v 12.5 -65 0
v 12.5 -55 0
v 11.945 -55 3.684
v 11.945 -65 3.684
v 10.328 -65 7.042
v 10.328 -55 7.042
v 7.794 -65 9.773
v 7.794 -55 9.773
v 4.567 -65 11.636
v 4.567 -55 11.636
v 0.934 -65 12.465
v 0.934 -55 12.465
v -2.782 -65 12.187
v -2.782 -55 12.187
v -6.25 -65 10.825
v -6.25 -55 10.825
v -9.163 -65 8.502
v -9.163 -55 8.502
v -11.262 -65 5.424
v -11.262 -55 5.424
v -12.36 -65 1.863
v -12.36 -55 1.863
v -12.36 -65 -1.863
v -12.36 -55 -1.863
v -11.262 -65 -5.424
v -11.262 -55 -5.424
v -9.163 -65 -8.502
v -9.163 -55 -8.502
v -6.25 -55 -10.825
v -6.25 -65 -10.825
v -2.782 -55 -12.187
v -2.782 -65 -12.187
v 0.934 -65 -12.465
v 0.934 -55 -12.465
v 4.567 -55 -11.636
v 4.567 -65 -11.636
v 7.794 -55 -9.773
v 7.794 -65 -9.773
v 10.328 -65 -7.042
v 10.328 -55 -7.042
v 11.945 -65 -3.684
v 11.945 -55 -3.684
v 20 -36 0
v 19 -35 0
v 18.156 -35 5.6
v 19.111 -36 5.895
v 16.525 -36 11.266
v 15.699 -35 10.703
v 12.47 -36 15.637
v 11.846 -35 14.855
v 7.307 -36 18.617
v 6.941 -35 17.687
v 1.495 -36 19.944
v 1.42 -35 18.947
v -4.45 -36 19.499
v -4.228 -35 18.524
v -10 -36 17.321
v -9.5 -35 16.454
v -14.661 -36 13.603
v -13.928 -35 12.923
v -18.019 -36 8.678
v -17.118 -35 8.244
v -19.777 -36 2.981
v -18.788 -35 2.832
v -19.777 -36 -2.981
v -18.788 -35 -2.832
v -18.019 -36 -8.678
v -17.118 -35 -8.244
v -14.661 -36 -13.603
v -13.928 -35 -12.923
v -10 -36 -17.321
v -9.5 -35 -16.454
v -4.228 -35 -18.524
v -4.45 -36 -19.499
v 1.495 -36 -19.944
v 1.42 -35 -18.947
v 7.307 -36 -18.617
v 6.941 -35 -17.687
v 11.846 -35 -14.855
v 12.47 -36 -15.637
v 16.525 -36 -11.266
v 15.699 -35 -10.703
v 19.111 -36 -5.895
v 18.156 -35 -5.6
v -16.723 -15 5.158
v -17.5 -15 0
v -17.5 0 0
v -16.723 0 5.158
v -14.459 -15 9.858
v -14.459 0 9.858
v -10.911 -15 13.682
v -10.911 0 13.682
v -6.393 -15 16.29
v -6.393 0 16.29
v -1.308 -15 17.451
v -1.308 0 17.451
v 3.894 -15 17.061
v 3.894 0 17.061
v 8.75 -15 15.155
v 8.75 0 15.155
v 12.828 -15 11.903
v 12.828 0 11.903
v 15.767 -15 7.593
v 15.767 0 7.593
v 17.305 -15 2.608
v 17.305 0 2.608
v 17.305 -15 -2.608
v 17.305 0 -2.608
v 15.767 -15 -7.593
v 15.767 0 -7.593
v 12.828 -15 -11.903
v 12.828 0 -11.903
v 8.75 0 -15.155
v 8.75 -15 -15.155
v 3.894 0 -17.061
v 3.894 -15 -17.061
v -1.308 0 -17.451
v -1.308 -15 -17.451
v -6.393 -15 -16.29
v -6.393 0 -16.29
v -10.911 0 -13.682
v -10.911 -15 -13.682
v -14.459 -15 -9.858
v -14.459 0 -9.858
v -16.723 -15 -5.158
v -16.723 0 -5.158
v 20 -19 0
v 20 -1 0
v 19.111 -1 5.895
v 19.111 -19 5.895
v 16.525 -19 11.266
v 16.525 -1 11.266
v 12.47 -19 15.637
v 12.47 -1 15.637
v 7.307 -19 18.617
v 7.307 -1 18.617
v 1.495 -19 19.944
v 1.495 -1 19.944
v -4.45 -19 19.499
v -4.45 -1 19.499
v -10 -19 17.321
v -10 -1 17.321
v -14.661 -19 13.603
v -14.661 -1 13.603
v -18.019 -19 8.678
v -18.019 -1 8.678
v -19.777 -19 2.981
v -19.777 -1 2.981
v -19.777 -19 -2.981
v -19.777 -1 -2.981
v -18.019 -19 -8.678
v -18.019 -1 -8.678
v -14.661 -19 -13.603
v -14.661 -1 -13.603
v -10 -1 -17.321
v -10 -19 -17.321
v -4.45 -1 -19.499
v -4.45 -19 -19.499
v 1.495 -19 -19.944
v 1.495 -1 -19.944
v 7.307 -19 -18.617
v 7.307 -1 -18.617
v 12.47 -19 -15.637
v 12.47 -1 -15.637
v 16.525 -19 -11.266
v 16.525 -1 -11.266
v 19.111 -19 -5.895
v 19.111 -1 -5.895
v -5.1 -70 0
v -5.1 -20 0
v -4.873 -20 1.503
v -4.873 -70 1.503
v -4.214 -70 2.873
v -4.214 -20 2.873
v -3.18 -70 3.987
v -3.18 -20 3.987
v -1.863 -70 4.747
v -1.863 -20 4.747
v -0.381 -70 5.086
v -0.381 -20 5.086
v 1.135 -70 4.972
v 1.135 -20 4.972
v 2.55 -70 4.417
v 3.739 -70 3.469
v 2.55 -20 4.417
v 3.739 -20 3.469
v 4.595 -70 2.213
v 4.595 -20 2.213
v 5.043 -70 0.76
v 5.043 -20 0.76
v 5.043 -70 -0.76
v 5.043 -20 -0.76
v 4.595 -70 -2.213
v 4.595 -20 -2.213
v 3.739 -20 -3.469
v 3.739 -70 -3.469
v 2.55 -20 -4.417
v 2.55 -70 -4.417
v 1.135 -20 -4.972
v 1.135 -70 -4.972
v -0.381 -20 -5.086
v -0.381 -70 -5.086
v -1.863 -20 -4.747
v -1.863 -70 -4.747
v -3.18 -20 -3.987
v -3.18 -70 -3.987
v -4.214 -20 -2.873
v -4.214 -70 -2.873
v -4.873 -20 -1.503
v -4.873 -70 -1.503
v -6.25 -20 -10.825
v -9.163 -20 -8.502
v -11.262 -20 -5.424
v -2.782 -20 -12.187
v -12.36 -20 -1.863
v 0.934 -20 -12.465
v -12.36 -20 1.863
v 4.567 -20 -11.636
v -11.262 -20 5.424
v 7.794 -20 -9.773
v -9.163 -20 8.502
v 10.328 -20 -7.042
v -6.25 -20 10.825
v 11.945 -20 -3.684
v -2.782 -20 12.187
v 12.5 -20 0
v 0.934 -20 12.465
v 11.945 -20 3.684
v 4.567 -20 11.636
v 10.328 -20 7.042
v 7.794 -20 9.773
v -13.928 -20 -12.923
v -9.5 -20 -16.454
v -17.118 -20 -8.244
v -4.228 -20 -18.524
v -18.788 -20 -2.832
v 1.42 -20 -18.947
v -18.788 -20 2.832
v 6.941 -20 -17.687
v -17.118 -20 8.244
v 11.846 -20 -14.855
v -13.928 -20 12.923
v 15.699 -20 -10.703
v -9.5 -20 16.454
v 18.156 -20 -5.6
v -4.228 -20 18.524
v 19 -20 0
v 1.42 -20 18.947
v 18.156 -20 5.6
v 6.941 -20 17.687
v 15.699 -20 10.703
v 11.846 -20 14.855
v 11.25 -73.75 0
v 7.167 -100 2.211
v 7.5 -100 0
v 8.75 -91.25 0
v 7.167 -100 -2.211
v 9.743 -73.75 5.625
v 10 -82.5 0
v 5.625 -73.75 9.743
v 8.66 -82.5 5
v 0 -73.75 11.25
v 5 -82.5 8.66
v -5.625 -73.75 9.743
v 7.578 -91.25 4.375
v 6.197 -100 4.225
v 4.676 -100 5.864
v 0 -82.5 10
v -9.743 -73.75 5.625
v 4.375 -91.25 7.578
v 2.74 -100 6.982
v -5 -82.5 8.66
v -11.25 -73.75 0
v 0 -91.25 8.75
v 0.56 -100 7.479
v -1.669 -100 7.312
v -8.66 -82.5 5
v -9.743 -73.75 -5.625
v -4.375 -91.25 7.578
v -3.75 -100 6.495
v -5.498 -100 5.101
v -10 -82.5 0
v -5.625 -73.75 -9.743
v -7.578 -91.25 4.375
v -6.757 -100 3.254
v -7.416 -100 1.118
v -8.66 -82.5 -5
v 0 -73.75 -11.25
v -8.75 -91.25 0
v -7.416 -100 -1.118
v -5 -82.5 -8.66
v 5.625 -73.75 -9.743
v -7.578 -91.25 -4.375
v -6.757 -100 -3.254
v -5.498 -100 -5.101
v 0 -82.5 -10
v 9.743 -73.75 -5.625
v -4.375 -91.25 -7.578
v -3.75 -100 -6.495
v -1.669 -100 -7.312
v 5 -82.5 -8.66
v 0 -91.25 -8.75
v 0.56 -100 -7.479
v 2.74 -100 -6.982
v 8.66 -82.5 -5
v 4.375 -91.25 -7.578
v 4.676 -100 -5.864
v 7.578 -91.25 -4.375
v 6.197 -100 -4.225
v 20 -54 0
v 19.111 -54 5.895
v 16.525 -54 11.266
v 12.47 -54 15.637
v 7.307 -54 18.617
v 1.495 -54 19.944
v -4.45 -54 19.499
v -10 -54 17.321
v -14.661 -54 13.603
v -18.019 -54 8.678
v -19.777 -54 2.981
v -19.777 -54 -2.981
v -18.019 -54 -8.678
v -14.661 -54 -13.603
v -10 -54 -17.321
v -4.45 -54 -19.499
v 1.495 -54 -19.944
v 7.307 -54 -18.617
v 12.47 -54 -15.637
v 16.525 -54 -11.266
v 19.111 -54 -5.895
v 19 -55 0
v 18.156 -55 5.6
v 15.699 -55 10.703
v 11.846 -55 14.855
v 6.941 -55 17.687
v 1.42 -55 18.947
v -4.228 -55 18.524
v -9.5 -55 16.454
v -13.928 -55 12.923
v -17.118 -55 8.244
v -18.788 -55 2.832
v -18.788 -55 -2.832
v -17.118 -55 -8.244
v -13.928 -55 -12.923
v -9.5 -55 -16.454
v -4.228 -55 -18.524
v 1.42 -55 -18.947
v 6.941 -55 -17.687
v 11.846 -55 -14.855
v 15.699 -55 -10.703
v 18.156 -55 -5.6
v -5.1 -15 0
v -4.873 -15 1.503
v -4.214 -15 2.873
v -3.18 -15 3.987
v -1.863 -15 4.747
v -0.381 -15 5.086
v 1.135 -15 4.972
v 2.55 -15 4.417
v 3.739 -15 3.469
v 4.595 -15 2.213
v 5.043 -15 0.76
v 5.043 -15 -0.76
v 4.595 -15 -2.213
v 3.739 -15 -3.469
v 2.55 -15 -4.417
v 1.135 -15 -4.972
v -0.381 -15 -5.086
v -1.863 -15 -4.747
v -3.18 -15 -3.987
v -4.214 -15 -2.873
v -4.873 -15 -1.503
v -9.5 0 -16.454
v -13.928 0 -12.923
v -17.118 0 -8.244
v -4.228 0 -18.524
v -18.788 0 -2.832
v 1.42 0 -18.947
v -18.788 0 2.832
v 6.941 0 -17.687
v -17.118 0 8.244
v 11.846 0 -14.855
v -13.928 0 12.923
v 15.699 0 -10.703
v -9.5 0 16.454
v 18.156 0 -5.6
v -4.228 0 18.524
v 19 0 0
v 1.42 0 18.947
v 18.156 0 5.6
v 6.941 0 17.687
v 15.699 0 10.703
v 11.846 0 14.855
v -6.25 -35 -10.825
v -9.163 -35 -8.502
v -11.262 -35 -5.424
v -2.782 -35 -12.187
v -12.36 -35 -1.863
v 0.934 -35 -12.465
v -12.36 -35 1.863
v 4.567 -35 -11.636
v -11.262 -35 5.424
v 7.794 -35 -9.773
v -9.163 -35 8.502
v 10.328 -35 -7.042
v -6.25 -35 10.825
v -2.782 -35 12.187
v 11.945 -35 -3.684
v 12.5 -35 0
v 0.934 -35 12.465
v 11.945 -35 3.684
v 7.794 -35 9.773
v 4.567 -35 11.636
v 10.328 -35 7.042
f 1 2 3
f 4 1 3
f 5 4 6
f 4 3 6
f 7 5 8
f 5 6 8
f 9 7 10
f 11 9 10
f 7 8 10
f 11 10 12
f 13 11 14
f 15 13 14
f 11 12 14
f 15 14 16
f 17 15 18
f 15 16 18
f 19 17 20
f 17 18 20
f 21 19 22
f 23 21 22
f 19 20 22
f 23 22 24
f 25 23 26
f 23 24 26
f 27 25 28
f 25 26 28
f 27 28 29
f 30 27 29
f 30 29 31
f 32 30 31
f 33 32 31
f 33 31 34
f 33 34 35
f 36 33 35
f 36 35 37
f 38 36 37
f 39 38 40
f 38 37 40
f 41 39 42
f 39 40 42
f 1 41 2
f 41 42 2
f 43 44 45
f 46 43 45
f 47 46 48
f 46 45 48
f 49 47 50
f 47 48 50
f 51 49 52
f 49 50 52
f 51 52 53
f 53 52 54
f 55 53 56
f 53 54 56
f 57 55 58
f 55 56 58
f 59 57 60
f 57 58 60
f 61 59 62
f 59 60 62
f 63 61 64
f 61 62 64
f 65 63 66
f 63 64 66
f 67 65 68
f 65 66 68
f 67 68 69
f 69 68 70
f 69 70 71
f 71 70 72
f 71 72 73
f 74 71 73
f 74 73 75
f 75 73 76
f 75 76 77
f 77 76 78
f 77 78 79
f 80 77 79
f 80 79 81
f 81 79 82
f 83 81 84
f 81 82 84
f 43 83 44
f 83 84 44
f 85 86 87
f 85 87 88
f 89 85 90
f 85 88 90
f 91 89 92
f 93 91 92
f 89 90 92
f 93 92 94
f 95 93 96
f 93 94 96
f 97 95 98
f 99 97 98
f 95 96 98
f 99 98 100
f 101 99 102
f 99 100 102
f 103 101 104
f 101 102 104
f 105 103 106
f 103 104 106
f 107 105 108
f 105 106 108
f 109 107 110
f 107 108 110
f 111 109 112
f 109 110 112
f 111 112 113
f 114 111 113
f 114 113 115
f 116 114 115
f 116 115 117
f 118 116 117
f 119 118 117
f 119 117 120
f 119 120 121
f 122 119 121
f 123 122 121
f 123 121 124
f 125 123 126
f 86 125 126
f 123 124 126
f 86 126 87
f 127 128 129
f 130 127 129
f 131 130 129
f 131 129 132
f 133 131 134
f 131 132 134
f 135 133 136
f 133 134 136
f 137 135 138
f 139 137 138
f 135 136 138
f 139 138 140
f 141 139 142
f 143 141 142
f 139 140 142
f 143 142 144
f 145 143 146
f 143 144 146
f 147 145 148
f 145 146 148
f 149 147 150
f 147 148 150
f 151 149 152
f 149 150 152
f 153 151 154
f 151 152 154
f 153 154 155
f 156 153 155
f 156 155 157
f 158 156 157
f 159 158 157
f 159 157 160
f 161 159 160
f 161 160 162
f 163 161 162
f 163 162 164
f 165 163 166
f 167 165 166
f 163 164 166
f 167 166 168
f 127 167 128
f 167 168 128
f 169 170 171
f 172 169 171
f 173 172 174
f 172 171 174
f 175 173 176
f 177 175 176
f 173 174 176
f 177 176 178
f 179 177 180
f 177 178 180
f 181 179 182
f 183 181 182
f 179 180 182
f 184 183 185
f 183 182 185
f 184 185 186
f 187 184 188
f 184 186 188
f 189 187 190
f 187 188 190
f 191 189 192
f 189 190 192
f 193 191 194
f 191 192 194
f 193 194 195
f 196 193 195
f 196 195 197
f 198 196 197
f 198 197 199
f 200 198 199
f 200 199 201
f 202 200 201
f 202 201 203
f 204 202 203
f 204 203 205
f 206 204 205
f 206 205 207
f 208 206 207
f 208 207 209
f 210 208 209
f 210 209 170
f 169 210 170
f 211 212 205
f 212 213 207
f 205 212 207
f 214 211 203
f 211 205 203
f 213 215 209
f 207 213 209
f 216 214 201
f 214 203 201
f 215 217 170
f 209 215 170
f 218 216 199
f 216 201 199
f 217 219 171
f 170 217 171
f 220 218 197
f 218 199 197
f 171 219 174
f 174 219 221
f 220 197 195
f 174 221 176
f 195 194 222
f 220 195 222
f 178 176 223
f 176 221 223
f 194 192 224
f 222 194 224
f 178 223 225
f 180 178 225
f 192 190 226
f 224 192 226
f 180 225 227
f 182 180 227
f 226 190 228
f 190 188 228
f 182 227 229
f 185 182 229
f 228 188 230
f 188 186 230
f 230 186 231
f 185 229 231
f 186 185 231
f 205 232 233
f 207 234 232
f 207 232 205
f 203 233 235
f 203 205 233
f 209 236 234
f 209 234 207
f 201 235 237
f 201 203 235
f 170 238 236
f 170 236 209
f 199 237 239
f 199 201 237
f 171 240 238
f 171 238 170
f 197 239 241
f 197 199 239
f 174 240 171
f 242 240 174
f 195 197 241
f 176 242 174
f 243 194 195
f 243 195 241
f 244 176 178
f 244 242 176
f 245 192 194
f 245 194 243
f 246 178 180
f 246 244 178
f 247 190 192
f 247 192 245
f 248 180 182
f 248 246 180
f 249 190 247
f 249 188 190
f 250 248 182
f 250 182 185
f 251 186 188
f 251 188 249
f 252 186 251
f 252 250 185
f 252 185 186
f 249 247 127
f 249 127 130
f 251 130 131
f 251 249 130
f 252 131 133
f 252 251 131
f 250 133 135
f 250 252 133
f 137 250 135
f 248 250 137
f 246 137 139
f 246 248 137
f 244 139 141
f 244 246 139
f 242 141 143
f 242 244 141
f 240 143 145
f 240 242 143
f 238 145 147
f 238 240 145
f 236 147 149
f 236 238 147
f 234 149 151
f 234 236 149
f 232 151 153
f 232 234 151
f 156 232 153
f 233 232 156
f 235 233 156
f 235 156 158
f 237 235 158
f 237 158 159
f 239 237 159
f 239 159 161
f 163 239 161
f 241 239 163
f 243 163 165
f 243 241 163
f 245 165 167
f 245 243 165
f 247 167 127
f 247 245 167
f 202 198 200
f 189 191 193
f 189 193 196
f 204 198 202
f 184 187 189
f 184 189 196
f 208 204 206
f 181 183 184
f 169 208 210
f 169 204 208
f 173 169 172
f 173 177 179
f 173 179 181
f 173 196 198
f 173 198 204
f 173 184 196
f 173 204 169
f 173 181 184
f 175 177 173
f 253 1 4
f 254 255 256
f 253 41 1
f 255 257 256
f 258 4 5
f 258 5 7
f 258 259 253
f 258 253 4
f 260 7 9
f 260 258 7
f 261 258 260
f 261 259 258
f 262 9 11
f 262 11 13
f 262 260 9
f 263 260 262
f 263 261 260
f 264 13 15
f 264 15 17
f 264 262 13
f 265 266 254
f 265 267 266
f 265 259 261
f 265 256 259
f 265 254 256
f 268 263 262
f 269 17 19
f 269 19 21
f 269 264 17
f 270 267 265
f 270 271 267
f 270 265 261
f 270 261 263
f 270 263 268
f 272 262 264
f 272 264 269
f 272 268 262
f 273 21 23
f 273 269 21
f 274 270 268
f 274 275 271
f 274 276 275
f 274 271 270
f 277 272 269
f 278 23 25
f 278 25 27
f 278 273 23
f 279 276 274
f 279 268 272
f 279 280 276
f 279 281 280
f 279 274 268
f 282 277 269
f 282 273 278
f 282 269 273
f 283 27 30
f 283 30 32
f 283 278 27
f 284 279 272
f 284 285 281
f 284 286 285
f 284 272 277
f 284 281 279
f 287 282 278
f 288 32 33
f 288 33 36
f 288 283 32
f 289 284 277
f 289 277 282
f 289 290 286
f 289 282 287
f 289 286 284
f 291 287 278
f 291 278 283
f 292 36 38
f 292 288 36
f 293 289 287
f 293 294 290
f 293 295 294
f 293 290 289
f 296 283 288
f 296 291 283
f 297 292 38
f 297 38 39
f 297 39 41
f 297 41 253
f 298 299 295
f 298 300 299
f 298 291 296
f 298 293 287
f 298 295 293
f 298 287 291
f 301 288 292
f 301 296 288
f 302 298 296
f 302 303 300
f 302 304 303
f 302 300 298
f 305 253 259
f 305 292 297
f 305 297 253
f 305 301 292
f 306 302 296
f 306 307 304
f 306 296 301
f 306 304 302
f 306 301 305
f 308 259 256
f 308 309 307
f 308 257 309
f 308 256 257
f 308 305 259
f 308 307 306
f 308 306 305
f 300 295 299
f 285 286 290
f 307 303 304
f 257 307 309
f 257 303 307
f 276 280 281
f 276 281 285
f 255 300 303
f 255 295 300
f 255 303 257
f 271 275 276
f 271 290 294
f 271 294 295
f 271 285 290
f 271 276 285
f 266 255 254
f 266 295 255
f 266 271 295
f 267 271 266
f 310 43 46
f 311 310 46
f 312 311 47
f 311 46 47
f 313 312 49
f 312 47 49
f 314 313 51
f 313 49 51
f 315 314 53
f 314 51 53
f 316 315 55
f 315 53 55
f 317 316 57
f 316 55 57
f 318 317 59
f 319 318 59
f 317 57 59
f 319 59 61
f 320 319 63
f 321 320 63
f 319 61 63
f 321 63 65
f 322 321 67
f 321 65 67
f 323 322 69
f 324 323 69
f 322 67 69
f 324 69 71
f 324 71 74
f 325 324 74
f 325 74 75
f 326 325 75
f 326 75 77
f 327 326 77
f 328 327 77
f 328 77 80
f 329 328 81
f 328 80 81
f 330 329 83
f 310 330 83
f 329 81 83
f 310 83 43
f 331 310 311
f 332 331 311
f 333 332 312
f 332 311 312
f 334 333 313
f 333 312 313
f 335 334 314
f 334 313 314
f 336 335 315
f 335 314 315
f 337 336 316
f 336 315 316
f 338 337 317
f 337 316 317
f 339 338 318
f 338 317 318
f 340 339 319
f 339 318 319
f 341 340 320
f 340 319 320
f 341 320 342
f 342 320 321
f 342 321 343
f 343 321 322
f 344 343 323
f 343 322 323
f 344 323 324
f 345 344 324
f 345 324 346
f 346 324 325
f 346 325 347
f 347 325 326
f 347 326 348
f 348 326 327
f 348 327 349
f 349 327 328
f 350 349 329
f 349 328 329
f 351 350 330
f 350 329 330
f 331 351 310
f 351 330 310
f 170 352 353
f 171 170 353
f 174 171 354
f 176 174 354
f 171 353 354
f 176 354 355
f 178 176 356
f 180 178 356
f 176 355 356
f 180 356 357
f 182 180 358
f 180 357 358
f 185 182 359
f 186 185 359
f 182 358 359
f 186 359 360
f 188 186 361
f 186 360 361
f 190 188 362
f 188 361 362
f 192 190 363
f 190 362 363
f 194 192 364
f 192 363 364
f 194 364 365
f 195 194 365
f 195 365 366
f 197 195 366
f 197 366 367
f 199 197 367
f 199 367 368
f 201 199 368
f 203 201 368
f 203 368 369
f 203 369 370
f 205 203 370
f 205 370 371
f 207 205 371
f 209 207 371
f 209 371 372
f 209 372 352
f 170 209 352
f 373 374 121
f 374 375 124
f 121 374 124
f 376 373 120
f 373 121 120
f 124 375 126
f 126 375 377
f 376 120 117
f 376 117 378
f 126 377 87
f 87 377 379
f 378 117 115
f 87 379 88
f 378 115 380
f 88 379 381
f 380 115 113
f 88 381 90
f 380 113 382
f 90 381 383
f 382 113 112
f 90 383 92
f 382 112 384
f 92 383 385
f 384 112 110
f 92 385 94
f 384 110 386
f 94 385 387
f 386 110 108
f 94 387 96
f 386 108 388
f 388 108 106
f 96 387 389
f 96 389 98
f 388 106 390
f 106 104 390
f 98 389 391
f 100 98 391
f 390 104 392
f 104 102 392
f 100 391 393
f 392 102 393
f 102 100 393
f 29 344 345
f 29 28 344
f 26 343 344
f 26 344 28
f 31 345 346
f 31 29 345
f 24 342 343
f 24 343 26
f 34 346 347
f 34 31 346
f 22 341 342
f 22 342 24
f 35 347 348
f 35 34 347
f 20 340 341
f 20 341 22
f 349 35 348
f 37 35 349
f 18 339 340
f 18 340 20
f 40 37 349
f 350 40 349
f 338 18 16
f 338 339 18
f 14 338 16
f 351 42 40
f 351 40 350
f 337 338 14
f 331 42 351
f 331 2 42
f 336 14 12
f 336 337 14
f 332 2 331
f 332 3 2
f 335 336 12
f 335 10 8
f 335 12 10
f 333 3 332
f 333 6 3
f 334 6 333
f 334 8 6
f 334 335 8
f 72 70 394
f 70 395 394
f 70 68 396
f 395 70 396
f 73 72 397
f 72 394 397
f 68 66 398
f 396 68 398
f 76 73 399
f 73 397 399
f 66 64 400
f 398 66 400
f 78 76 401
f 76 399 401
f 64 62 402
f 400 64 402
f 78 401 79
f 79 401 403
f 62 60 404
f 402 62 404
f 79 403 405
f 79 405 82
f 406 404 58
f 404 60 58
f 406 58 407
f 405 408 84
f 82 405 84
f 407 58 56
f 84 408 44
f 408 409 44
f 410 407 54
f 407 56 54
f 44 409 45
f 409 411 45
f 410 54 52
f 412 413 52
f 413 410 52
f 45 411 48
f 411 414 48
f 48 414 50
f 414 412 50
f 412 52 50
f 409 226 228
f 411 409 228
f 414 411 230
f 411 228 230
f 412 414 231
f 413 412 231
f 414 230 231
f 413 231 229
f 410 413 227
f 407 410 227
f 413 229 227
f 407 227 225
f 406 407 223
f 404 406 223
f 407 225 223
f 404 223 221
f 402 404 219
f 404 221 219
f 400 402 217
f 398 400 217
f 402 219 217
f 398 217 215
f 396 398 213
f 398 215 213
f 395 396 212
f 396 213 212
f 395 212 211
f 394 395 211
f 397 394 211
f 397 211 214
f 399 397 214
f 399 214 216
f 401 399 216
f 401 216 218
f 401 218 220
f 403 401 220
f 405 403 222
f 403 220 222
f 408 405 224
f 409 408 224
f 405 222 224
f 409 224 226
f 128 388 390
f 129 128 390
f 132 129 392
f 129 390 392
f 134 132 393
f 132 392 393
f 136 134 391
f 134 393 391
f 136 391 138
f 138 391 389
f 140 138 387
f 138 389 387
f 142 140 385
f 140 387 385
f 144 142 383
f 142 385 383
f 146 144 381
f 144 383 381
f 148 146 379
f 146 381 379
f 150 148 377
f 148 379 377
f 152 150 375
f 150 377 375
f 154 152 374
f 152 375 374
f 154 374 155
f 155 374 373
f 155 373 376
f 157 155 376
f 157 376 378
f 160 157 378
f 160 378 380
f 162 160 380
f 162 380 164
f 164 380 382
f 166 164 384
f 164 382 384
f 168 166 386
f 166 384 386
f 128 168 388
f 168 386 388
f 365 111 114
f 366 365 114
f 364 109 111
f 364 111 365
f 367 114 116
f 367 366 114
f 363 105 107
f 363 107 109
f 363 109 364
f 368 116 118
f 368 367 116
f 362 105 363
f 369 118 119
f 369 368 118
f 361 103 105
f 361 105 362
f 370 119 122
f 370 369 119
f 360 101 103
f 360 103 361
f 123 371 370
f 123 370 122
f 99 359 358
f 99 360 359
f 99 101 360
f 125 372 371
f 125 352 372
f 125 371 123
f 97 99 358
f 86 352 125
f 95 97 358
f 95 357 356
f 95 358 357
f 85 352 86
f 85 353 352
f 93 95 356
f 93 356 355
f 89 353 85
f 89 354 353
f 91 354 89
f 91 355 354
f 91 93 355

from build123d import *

# Parameters (mm, degrees)
F0_R       = 20
F1_DEPTH   = 20
F2_R       = 12.5
F3_DEPTH   = 15
F4_R       = 20
F4_R_2     = 12.5
F5_DEPTH   = 20
F6_R       = 12.5
F7_DEPTH   = 10
F8_R       = 12.5
F10_R      = 7.5
F12_SIZE   = 1
F12_2_SIZE = 1
F13_R      = 17.5
F14_DEPTH  = 15
F15_R      = 5.1
F16_DEPTH  = 55


with BuildPart() as f1:
    # F0 (on Front) → F1 (new body)
    with BuildSketch(Plane.XZ):
        Circle(F0_R)
    extrude(amount=F1_DEPTH)

    # F12
    f12_edges = [f1.edges().sort_by_distance(p)[0] for p in [
        (-20, 0, 0),
        (-20, -20, 0),
    ]]
    chamfer(f12_edges, length=F12_SIZE)

    # F13 (on face) → F14 (cut)
    with BuildSketch(Plane(origin=(0, 0, 0), x_dir=(-1, 0, 0), z_dir=(0, 1, 0))):
        Circle(F13_R)
    extrude(amount=-F14_DEPTH, mode=Mode.SUBTRACT)


with BuildPart() as f3:
    # F2 (on face) → F3 (new body)
    with BuildSketch(Plane.XZ.offset(20)):
        Circle(F2_R)
    extrude(amount=F3_DEPTH)

    # F4 (on face) → F5 (join)
    with BuildSketch(Plane.XZ.offset(35)):
        Circle(F4_R)
        Circle(F4_R_2, mode=Mode.SUBTRACT)
        Circle(F4_R_2)
    extrude(amount=F5_DEPTH)

    # F6 (on face) → F7 (join)
    with BuildSketch(Plane.XZ.offset(55)):
        Circle(F6_R)
    extrude(amount=F7_DEPTH)

    # F8 (on face) → F11 section 0
    with BuildSketch(Plane.XZ.offset(65)):
        Circle(F8_R)
    # F10 (on offset) → F11 section 1
    with BuildSketch(Plane.XZ.offset(100)):
        Circle(F10_R)
    loft()

    # F12#2
    f12_2_edges = [f3.edges().sort_by_distance(p)[0] for p in [
        (-20, -35, 0),
        (-20, -55, 0),
    ]]
    chamfer(f12_2_edges, length=F12_2_SIZE)


with BuildPart() as f16_tool:
    # F15 (on face) → F16 (new body)
    with BuildSketch(Plane(origin=(0, -15, 0), x_dir=(-1, 0, 0), z_dir=(0, 1, 0))):
        Circle(F15_R)
    extrude(amount=-F16_DEPTH)


with BuildPart() as f1_1:
    add(f1.part)

    # F16: cut by f16_tool
    add(f16_tool.part, mode=Mode.SUBTRACT)


with BuildPart() as f3_1:
    add(f3.part)

    # F16: cut by f16_tool
    add(f16_tool.part, mode=Mode.SUBTRACT)


solid = Compound([f1_1.part, f3_1.part])
